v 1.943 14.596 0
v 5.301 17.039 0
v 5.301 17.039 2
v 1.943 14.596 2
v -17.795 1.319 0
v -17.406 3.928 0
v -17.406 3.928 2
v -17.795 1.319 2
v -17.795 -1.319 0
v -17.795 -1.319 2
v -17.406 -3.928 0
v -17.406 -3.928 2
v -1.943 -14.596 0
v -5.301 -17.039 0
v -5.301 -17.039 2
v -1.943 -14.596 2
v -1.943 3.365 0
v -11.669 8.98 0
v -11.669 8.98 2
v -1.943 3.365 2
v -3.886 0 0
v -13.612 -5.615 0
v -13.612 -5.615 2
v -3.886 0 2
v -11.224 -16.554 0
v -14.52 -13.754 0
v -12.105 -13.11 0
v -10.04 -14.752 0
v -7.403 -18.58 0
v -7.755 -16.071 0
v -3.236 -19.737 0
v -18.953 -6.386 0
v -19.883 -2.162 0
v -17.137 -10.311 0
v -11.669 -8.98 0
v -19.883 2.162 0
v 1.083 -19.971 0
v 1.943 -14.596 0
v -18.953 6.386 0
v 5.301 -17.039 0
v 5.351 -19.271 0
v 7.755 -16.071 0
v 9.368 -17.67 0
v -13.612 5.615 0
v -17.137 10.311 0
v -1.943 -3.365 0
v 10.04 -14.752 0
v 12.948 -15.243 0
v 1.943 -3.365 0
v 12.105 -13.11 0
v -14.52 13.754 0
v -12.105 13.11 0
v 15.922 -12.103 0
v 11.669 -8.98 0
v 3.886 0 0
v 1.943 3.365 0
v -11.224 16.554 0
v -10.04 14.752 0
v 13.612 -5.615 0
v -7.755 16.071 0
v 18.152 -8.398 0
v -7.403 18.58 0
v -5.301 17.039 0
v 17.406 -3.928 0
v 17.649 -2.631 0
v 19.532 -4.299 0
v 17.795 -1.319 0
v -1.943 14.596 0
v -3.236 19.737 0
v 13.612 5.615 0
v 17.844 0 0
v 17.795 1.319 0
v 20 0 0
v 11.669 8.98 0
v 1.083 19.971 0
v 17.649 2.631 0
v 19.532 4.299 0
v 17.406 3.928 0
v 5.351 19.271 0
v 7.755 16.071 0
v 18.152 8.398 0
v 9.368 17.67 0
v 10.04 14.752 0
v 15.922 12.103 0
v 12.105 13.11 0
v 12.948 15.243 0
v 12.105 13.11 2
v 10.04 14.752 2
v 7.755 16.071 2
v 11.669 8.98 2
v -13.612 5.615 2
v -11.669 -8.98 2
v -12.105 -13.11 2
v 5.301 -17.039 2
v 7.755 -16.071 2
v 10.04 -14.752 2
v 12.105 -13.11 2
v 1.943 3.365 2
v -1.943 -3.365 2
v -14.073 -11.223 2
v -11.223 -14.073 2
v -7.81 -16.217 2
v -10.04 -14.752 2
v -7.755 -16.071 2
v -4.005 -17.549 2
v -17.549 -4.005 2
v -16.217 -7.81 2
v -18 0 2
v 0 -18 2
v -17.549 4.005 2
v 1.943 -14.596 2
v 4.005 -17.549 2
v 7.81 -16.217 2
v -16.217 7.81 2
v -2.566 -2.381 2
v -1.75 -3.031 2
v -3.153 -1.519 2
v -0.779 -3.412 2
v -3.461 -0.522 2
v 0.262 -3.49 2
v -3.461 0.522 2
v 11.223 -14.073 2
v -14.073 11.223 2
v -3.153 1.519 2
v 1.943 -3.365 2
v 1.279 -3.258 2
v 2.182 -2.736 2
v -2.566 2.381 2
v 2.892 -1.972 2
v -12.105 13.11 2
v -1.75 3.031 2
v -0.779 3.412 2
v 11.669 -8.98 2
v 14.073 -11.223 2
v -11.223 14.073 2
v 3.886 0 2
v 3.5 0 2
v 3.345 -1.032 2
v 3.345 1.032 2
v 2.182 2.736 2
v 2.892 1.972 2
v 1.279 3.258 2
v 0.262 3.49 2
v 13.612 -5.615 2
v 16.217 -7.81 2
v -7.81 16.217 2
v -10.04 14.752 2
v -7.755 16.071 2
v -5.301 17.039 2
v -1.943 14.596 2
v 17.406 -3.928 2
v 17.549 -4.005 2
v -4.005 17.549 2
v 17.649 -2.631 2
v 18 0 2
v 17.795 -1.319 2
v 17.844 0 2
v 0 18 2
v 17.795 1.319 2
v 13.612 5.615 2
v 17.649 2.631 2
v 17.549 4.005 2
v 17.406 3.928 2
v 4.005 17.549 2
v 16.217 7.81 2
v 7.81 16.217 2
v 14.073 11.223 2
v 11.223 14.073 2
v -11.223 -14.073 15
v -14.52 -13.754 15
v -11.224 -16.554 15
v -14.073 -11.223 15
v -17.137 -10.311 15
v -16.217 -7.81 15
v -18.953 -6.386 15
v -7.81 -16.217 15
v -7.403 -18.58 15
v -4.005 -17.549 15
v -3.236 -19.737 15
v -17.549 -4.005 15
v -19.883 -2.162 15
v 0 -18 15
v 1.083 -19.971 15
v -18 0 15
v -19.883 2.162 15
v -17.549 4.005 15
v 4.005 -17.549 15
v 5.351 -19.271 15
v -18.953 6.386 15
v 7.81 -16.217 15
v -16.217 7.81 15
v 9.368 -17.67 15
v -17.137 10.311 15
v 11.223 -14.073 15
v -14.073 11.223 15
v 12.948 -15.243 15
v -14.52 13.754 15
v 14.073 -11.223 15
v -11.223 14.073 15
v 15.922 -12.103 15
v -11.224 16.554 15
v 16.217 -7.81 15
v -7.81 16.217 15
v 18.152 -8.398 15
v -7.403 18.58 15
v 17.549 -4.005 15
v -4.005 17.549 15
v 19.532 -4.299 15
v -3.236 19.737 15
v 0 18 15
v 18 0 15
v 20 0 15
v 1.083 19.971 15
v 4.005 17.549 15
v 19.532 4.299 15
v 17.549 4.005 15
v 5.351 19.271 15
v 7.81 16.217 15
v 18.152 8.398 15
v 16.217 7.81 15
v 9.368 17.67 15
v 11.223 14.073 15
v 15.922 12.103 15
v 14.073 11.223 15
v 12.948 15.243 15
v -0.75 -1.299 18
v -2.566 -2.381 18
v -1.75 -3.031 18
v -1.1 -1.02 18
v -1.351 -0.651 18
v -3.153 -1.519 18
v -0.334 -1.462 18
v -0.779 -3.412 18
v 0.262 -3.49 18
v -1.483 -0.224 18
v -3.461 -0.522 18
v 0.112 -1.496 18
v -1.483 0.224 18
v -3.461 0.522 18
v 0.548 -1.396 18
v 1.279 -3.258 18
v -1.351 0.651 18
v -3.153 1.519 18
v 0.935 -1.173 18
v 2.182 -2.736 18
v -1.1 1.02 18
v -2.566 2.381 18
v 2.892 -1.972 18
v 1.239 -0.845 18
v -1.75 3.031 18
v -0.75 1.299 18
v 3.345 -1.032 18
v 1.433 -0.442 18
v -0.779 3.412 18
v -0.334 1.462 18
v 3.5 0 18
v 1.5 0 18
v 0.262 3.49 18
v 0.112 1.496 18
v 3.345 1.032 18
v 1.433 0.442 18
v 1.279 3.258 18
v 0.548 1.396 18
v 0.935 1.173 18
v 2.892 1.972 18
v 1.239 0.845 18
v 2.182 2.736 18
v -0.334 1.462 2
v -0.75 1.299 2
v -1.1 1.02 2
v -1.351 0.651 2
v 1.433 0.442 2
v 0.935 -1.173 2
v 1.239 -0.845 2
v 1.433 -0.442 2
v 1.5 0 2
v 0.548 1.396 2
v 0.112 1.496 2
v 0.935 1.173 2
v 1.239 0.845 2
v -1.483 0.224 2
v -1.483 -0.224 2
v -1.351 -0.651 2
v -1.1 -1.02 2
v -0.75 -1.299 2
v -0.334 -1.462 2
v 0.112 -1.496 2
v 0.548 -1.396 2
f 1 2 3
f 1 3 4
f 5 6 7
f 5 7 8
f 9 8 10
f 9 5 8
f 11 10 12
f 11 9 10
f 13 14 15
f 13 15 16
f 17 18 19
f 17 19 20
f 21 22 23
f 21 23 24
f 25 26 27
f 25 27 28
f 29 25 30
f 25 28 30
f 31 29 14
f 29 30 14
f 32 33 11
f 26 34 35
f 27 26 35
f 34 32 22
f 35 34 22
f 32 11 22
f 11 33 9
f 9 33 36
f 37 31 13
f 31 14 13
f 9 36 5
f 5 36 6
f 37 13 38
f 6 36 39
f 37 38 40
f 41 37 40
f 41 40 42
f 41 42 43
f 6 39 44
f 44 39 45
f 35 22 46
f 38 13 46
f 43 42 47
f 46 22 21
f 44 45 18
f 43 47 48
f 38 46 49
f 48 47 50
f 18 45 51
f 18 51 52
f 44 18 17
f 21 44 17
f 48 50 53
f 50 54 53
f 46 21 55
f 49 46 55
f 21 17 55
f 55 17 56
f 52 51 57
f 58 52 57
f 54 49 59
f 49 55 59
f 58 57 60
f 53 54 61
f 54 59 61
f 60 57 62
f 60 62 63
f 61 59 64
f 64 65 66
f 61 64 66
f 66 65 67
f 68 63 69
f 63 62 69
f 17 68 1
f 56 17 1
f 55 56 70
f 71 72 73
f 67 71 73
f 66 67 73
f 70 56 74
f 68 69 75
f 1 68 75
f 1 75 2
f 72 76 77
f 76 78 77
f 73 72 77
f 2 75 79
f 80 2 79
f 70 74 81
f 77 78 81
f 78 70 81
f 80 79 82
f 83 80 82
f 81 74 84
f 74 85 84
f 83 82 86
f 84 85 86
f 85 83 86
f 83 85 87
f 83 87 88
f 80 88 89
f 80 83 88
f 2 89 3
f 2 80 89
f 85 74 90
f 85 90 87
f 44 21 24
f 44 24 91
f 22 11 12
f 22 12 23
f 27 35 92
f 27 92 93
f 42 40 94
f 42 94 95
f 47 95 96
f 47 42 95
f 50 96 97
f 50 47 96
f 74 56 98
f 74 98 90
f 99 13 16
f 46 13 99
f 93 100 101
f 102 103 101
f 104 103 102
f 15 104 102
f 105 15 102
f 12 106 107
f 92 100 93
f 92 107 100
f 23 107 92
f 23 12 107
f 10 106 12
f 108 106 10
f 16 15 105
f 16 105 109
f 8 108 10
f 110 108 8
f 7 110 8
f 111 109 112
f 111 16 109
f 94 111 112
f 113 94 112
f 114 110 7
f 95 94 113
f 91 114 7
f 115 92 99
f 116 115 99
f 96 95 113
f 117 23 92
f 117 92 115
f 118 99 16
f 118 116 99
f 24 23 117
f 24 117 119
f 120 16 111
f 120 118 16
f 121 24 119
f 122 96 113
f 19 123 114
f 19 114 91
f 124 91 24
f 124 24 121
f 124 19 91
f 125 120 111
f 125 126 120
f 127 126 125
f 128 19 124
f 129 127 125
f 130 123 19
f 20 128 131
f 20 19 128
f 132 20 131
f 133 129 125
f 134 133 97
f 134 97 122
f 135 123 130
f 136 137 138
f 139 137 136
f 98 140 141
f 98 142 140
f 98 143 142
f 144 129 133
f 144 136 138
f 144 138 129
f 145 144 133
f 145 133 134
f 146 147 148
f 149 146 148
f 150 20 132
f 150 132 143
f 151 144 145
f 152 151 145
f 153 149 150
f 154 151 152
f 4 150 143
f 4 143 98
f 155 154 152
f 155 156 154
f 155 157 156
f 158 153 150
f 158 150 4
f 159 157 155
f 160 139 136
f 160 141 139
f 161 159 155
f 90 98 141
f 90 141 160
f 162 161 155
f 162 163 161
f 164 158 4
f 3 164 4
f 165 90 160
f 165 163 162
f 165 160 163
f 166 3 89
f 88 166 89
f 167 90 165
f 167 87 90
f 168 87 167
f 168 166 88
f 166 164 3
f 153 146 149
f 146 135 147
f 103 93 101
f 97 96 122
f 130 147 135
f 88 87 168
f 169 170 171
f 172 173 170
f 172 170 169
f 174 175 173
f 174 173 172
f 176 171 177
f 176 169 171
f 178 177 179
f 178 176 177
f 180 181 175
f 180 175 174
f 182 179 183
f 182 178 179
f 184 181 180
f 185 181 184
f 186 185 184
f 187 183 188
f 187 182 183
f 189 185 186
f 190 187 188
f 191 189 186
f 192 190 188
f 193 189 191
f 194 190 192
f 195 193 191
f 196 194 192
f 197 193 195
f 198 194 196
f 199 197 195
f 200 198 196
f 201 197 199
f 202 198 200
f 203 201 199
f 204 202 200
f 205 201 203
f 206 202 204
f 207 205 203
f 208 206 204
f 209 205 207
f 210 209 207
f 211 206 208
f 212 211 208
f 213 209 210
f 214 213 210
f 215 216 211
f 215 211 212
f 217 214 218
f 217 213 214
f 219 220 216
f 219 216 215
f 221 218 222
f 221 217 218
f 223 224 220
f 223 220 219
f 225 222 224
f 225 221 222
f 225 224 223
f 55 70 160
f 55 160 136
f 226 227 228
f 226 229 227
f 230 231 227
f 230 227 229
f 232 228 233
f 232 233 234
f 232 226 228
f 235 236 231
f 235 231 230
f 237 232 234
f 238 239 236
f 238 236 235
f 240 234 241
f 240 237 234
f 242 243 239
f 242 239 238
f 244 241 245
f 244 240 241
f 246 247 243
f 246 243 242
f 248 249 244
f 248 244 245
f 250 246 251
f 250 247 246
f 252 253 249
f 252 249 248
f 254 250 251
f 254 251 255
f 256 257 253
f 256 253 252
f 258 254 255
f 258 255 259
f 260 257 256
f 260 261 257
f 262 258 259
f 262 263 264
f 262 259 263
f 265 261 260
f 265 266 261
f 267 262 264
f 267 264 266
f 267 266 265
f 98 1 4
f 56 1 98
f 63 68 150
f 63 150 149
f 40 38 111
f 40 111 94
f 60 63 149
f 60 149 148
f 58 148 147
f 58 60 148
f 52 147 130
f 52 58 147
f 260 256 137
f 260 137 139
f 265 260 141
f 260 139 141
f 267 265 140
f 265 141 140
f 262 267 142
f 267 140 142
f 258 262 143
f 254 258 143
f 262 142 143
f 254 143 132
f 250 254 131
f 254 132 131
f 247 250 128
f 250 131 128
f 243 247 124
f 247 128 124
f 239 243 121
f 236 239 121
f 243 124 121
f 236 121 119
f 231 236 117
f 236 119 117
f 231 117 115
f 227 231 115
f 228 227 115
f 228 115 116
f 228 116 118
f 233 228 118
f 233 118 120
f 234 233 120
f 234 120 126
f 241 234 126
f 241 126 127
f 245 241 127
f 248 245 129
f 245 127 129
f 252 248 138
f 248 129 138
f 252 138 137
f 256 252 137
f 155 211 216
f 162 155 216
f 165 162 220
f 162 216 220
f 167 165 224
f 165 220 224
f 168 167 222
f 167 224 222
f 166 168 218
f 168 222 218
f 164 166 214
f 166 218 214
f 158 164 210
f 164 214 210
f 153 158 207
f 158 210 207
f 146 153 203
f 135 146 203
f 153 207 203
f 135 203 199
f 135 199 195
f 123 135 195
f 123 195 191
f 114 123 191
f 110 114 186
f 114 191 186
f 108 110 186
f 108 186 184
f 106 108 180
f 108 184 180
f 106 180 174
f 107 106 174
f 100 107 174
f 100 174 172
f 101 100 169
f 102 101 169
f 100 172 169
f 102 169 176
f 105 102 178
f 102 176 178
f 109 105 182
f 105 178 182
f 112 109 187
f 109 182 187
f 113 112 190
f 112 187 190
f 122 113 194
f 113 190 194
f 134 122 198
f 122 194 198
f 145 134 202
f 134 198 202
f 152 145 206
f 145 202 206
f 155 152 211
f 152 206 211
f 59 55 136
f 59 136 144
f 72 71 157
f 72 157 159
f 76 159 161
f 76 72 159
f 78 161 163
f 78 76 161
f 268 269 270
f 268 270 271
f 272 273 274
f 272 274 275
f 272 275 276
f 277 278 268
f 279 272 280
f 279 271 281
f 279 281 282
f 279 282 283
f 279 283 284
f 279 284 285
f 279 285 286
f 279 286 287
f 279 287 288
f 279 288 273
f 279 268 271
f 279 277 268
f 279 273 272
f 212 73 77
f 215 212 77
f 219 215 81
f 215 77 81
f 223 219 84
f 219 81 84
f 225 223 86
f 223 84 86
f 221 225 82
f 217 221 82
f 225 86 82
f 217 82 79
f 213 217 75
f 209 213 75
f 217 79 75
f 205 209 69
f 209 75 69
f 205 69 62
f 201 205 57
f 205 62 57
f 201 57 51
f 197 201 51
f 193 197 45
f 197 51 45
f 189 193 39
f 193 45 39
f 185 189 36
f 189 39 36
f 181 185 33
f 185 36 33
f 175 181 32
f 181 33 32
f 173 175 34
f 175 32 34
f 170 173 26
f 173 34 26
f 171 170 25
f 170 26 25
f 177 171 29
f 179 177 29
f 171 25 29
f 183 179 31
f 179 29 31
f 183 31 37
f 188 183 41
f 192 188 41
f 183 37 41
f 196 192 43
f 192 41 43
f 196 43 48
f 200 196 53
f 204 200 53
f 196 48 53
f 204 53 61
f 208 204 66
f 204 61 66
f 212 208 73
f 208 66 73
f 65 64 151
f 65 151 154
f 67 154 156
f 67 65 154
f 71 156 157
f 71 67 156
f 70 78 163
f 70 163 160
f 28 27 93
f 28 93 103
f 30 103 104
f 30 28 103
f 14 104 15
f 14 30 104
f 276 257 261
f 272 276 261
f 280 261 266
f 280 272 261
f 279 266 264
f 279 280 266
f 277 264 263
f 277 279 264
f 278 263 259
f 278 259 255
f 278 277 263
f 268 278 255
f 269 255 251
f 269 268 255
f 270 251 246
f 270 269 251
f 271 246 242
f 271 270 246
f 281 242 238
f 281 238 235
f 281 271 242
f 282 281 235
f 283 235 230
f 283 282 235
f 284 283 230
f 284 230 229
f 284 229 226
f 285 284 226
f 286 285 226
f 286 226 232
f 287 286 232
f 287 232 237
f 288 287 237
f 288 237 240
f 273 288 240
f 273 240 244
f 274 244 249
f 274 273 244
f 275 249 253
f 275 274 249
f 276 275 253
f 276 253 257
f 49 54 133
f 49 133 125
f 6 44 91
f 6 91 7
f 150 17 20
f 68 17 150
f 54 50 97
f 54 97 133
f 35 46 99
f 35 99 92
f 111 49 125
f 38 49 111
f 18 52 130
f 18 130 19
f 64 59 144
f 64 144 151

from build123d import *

# Parameters (mm, degrees)
F0_R     = 20
F1_DEPTH = 15
F2_R     = 18
F3_DEPTH = 13
F4_R     = 3.5
F4_R_2   = 1.5
F5_DEPTH = 16
F7_DEPTH = 2


with BuildPart() as f1:
    # F0 (on Top) → F1 (new body)
    with BuildSketch(Plane.XY):
        Circle(F0_R)
    extrude(amount=F1_DEPTH)

    # F2 (on face) → F3 (cut)
    with BuildSketch(Plane.XY.offset(15)):
        Circle(F2_R)
    extrude(amount=-F3_DEPTH, mode=Mode.SUBTRACT)

    # F4 (on face) → F5 (join)
    with BuildSketch(Plane.XY.offset(2)):
        Circle(F4_R)
        Circle(F4_R_2, mode=Mode.SUBTRACT)
    extrude(amount=F5_DEPTH)

    # F6 (on Top) → F7 (cut)
    with BuildSketch(Plane.XY):
        with BuildLine():
            Line((-13.61187, 5.615484), (-17.40644, 3.928479))
            ThreePointArc((-17.40644, 3.928479), (-17.844245, 0), (-17.40644, -3.928479))
            Line((-17.40644, -3.928479), (-13.61187, -5.615484))
            Line((-13.61187, -5.615484), (-3.885566, 0))
            Line((-3.885566, 0), (-13.61187, 5.615484))
        make_face()
        with BuildLine():
            Line((-11.669087, -8.980484), (-12.105382, -13.110179))
            ThreePointArc((-12.105382, -13.110179), (-8.922123, -15.45357), (-5.301057, -17.038658))
            Line((-5.301057, -17.038658), (-1.942783, -14.595968))
            Line((-1.942783, -14.595968), (-1.942783, -3.364999))
            Line((-1.942783, -3.364999), (-11.669087, -8.980484))
        make_face()
        with BuildLine():
            Line((1.942783, -14.595968), (5.301057, -17.038658))
            ThreePointArc((5.301057, -17.038658), (8.922123, -15.45357), (12.105382, -13.110179))
            Line((12.105382, -13.110179), (11.669087, -8.980484))
            Line((11.669087, -8.980484), (1.942783, -3.364999))
            Line((1.942783, -3.364999), (1.942783, -14.595968))
        make_face()
        with BuildLine():
            ThreePointArc((17.844245, 0), (17.734456, 1.976399), (17.40644, 3.928479))
            Line((17.40644, 3.928479), (13.61187, 5.615484))
            Line((13.61187, 5.615484), (3.885566, 0))
            Line((3.885566, 0), (13.61187, -5.615484))
            Line((13.61187, -5.615484), (17.40644, -3.928479))
            ThreePointArc((17.40644, -3.928479), (17.734456, -1.976399), (17.844245, 0))
        make_face()
        with BuildLine():
            ThreePointArc((12.105382, 13.110179), (8.922123, 15.45357), (5.301057, 17.038658))
            Line((5.301057, 17.038658), (1.942783, 14.595968))
            Line((1.942783, 14.595968), (1.942783, 3.364999))
            Line((1.942783, 3.364999), (11.669087, 8.980484))
            Line((11.669087, 8.980484), (12.105382, 13.110179))
        make_face()
        with BuildLine():
            Line((-11.669087, 8.980484), (-1.942783, 3.364999))
            Line((-1.942783, 3.364999), (-1.942783, 14.595968))
            Line((-1.942783, 14.595968), (-5.301057, 17.038658))
            ThreePointArc((-5.301057, 17.038658), (-8.922123, 15.45357), (-12.105382, 13.110179))
            Line((-12.105382, 13.110179), (-11.669087, 8.980484))
        make_face()
    extrude(amount=F7_DEPTH, mode=Mode.SUBTRACT)


solid = f1.part
